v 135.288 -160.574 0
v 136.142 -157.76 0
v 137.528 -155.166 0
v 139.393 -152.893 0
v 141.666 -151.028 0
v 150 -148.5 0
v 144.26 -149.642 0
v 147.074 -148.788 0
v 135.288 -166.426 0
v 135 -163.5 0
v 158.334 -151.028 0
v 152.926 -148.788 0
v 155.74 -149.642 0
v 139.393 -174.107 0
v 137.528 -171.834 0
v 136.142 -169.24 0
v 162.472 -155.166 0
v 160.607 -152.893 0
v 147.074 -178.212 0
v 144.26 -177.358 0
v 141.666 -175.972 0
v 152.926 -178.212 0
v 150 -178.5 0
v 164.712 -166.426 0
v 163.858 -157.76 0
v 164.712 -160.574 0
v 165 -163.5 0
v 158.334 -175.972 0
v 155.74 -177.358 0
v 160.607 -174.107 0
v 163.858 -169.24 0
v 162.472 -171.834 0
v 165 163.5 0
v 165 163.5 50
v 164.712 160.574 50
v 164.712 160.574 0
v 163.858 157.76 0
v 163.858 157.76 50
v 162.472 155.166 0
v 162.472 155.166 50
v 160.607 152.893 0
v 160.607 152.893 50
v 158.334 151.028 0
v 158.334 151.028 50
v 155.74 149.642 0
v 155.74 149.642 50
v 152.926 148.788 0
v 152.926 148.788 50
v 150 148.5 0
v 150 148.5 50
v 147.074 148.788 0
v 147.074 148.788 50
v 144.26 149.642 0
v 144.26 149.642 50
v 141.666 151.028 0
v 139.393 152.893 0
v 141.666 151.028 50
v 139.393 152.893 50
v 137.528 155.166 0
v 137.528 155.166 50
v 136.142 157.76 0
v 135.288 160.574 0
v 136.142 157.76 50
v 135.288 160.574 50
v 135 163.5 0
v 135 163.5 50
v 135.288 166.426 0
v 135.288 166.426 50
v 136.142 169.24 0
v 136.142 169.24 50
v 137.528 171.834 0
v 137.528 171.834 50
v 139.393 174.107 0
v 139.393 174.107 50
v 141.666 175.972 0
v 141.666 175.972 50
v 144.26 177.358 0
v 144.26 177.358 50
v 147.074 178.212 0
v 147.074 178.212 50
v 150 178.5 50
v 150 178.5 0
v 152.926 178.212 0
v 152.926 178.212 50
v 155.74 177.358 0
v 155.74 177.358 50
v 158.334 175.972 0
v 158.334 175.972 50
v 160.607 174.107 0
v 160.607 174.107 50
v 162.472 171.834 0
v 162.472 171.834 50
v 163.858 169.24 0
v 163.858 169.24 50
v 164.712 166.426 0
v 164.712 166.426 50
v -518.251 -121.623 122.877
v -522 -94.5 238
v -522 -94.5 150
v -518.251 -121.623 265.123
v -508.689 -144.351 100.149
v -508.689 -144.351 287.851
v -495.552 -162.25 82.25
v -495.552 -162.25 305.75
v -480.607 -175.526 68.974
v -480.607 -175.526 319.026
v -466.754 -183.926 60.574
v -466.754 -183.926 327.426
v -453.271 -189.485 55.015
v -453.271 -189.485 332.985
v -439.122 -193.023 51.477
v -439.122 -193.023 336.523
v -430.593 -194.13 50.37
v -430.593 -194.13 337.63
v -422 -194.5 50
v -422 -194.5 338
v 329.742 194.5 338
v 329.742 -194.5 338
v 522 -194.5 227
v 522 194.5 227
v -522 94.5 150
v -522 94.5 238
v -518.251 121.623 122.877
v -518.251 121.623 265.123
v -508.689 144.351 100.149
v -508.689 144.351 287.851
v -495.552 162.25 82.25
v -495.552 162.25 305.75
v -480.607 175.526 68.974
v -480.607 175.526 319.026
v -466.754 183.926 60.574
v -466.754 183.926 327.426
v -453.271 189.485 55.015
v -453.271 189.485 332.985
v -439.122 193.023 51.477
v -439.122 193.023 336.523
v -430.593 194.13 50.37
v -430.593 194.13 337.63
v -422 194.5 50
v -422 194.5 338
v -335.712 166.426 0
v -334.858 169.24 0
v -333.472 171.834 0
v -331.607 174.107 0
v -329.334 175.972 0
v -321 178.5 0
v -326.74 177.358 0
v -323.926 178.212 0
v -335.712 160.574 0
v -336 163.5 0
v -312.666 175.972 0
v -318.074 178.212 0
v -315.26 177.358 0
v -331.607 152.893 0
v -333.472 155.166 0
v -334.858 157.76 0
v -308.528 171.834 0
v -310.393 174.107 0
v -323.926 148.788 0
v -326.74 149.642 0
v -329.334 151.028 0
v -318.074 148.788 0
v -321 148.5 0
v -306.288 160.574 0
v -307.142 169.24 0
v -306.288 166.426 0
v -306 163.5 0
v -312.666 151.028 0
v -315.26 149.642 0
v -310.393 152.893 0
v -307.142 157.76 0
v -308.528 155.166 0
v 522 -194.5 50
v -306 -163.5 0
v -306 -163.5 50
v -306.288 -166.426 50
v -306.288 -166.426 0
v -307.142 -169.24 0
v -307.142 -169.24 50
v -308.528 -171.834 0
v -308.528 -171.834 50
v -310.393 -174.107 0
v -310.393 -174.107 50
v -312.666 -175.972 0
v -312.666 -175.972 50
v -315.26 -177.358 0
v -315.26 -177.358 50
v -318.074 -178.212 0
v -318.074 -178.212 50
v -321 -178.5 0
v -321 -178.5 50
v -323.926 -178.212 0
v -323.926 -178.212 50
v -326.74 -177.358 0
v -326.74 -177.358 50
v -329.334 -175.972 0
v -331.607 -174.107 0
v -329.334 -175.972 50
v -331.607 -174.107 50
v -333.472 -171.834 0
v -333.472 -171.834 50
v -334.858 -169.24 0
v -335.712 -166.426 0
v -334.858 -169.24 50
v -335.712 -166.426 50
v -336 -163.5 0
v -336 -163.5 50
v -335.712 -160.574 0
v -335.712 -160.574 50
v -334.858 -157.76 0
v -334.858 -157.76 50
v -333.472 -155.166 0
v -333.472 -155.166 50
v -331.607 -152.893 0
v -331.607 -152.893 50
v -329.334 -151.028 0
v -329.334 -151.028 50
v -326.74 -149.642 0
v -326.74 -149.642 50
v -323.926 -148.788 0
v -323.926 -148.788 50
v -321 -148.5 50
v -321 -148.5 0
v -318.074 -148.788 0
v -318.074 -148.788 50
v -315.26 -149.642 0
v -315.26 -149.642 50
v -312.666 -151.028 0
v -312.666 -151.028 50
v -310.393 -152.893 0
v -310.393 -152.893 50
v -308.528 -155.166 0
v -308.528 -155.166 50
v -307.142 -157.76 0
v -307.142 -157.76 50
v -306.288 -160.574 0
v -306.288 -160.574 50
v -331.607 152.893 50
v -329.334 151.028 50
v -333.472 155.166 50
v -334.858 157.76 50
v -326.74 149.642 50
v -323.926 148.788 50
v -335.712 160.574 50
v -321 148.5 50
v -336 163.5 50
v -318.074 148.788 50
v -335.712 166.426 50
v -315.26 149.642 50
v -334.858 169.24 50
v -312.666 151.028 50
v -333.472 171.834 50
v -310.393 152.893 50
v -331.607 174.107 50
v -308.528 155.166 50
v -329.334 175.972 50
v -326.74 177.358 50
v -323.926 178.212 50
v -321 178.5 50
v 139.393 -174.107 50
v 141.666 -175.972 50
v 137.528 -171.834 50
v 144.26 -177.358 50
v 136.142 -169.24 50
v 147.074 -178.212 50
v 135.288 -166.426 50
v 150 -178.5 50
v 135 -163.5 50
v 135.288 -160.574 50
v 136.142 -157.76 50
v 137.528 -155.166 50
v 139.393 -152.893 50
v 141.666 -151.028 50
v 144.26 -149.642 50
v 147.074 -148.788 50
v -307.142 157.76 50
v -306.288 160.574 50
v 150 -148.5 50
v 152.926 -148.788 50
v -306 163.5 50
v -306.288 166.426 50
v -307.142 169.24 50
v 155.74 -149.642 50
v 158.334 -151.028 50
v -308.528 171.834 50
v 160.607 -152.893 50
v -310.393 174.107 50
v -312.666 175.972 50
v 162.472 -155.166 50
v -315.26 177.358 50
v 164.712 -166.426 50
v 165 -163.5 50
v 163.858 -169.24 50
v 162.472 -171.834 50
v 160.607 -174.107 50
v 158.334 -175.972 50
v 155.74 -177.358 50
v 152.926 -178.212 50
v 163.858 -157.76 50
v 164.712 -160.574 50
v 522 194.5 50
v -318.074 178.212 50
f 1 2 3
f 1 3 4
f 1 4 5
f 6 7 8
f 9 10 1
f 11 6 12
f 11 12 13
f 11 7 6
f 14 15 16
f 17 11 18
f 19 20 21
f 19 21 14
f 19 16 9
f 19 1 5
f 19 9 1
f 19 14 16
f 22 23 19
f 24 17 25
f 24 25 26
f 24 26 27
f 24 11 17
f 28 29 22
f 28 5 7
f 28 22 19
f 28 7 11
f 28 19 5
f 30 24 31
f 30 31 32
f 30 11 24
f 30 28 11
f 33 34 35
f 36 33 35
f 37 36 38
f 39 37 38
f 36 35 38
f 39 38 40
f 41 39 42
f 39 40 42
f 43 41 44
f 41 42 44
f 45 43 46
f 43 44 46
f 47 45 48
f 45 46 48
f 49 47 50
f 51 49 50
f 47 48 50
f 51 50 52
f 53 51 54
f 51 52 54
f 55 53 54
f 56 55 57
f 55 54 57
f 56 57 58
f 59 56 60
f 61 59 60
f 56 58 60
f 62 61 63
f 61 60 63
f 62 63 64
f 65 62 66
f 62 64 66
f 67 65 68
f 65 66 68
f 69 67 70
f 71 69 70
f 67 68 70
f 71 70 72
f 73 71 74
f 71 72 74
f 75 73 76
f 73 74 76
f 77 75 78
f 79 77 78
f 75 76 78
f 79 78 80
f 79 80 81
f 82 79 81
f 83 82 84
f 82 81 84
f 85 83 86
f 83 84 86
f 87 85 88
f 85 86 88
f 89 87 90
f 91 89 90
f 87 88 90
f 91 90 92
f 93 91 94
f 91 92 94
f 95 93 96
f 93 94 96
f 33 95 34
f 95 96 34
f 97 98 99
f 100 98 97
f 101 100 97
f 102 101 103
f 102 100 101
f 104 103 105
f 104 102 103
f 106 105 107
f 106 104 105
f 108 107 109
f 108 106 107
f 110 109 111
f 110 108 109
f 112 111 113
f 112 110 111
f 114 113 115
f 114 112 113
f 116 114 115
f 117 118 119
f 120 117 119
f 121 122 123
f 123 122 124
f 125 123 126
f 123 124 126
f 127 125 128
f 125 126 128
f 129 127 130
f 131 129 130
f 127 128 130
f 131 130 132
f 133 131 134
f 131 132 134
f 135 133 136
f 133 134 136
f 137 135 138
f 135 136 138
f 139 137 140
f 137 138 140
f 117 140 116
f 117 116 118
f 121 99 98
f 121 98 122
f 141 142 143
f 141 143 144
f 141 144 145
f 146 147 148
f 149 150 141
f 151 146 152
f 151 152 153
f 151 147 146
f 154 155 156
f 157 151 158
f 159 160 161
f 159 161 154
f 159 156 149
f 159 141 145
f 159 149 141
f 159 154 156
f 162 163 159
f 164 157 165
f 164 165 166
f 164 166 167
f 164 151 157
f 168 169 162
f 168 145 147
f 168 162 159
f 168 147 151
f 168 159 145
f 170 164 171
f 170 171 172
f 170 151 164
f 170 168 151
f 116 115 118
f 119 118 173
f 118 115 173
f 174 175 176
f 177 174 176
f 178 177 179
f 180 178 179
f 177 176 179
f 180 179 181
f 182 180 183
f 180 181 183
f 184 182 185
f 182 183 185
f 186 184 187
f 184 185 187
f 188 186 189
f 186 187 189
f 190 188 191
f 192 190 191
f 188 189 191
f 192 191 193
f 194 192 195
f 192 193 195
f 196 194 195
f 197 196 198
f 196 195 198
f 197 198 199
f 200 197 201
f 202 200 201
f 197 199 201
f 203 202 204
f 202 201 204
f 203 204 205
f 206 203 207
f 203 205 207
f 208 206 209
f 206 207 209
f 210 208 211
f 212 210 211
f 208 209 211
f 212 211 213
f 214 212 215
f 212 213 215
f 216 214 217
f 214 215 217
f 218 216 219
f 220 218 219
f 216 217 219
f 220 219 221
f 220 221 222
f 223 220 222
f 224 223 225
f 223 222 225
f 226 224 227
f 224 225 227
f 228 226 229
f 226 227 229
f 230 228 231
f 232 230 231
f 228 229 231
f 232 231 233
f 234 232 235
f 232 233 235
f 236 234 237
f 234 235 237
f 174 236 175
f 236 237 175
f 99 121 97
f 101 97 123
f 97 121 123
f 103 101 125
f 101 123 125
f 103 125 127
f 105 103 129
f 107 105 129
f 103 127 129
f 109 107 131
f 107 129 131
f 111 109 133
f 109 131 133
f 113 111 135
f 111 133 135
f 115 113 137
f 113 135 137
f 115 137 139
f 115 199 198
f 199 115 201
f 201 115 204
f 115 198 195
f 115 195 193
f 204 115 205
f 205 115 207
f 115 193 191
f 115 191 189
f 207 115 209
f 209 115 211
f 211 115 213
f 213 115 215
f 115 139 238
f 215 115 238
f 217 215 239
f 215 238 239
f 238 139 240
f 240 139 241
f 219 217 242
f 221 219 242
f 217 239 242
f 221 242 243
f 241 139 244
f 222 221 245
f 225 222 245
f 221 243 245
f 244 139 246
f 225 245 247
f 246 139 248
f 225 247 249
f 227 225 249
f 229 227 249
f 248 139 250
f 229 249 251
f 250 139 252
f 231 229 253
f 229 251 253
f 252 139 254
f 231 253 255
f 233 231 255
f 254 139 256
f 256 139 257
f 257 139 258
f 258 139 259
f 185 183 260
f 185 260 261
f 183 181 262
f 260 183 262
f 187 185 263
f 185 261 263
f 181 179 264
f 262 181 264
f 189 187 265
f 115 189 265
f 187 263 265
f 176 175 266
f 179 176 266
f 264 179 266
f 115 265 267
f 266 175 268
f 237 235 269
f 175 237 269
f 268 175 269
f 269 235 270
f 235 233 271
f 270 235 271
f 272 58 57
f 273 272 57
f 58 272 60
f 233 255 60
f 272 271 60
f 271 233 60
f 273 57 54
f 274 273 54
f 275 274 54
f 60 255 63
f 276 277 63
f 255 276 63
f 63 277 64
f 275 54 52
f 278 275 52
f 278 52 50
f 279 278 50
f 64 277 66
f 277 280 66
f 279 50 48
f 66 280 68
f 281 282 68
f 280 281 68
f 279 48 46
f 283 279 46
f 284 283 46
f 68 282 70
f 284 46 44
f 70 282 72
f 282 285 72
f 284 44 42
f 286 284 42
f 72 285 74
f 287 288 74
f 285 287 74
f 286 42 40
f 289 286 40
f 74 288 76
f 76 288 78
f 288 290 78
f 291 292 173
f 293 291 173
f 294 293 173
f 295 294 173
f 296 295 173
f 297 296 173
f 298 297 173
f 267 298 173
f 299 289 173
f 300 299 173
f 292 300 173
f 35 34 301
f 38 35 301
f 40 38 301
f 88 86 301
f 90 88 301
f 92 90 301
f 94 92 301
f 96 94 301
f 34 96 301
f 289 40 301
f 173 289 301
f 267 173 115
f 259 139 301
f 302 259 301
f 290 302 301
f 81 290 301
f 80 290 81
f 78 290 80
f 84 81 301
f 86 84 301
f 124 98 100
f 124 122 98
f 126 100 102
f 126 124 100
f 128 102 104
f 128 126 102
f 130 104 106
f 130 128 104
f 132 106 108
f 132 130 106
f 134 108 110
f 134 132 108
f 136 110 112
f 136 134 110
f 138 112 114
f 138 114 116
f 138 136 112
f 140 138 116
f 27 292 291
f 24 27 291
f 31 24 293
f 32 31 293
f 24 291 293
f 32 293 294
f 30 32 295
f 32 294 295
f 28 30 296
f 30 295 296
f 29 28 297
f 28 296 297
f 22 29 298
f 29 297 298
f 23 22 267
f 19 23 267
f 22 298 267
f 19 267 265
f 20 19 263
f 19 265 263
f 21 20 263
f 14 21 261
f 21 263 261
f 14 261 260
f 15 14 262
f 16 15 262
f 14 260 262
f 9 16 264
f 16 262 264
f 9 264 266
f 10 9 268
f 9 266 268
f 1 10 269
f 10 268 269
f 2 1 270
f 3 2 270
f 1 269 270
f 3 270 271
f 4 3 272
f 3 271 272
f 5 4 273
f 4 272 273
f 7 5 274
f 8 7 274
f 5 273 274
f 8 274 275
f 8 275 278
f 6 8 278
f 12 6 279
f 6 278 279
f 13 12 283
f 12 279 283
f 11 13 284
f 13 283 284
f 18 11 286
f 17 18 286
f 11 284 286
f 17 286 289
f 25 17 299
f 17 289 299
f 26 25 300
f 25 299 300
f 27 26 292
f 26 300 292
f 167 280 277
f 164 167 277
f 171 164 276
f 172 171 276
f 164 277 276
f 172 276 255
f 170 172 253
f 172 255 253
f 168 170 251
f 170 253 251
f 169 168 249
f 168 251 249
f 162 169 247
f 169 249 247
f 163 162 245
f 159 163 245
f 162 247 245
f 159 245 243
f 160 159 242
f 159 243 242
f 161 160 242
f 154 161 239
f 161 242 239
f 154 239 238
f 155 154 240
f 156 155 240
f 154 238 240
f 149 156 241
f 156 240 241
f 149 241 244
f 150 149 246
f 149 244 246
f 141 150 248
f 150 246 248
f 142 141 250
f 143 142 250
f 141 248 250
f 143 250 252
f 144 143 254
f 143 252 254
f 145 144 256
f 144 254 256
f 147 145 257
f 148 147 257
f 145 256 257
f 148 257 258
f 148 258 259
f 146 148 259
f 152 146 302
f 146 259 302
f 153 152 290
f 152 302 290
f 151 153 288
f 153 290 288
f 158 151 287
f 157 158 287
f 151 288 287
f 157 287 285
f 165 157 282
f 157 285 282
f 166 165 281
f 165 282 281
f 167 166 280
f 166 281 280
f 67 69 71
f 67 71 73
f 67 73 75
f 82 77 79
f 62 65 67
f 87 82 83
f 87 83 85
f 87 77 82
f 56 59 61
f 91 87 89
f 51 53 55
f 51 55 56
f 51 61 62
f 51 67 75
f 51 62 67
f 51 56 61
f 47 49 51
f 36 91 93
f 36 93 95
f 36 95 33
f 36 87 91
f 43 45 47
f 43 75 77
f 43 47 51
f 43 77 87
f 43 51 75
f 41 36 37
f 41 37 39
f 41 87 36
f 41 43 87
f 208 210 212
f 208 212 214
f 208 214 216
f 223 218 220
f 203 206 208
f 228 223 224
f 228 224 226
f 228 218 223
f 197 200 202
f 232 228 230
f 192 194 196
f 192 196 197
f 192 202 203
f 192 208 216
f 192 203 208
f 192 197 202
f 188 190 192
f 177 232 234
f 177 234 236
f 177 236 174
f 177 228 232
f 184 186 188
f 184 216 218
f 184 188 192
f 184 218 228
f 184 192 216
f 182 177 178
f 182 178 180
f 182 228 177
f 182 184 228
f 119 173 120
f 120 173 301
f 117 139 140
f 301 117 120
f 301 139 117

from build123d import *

# Parameters (mm, degrees)
F0_W     = 1044
F0_H     = 389
F1_DEPTH = 288
F3_DEPTH = 389
F4_R     = 100
F5_R     = 15
F6_DEPTH = 50


with BuildPart() as f1:
    # F0 (on Top) → F1 (new body)
    with BuildSketch(Plane.XY):
        Rectangle(F0_W, F0_H)
    extrude(amount=F1_DEPTH)

    # F2 (on face) → F3 (cut, through all)
    with BuildSketch(Plane.XZ.offset(194.5)):
        Polygon((522, 288), (329.74236, 288), (522, 177), align=None)
    extrude(amount=-F3_DEPTH, mode=Mode.SUBTRACT)

    # F4
    f4_edges = [f1.edges().sort_by_distance(p)[0] for p in [
        (-522, 194.5, 144),
        (-522, -194.5, 144),
        (-522, 0, 0),
        (-522, 0, 288),
    ]]
    fillet(f4_edges, radius=F4_R)

    # F5 (on face) → F6 (join)
    with BuildSketch(Plane(origin=(0, 0, 0), x_dir=(1, 0, 0), z_dir=(0, 0, -1))):
        with Locations((150, 163.5)):
            Circle(F5_R)
        with Locations((-321, 163.5)):
            Circle(F5_R)
        with Locations((-321, -163.5)):
            Circle(F5_R)
        with Locations((150, -163.5)):
            Circle(F5_R)
    extrude(amount=F6_DEPTH)


with BuildPart() as f1_1:
    # F7: moved
    add(f1.part.moved(Location((0, 0, 50))))


solid = f1_1.part
